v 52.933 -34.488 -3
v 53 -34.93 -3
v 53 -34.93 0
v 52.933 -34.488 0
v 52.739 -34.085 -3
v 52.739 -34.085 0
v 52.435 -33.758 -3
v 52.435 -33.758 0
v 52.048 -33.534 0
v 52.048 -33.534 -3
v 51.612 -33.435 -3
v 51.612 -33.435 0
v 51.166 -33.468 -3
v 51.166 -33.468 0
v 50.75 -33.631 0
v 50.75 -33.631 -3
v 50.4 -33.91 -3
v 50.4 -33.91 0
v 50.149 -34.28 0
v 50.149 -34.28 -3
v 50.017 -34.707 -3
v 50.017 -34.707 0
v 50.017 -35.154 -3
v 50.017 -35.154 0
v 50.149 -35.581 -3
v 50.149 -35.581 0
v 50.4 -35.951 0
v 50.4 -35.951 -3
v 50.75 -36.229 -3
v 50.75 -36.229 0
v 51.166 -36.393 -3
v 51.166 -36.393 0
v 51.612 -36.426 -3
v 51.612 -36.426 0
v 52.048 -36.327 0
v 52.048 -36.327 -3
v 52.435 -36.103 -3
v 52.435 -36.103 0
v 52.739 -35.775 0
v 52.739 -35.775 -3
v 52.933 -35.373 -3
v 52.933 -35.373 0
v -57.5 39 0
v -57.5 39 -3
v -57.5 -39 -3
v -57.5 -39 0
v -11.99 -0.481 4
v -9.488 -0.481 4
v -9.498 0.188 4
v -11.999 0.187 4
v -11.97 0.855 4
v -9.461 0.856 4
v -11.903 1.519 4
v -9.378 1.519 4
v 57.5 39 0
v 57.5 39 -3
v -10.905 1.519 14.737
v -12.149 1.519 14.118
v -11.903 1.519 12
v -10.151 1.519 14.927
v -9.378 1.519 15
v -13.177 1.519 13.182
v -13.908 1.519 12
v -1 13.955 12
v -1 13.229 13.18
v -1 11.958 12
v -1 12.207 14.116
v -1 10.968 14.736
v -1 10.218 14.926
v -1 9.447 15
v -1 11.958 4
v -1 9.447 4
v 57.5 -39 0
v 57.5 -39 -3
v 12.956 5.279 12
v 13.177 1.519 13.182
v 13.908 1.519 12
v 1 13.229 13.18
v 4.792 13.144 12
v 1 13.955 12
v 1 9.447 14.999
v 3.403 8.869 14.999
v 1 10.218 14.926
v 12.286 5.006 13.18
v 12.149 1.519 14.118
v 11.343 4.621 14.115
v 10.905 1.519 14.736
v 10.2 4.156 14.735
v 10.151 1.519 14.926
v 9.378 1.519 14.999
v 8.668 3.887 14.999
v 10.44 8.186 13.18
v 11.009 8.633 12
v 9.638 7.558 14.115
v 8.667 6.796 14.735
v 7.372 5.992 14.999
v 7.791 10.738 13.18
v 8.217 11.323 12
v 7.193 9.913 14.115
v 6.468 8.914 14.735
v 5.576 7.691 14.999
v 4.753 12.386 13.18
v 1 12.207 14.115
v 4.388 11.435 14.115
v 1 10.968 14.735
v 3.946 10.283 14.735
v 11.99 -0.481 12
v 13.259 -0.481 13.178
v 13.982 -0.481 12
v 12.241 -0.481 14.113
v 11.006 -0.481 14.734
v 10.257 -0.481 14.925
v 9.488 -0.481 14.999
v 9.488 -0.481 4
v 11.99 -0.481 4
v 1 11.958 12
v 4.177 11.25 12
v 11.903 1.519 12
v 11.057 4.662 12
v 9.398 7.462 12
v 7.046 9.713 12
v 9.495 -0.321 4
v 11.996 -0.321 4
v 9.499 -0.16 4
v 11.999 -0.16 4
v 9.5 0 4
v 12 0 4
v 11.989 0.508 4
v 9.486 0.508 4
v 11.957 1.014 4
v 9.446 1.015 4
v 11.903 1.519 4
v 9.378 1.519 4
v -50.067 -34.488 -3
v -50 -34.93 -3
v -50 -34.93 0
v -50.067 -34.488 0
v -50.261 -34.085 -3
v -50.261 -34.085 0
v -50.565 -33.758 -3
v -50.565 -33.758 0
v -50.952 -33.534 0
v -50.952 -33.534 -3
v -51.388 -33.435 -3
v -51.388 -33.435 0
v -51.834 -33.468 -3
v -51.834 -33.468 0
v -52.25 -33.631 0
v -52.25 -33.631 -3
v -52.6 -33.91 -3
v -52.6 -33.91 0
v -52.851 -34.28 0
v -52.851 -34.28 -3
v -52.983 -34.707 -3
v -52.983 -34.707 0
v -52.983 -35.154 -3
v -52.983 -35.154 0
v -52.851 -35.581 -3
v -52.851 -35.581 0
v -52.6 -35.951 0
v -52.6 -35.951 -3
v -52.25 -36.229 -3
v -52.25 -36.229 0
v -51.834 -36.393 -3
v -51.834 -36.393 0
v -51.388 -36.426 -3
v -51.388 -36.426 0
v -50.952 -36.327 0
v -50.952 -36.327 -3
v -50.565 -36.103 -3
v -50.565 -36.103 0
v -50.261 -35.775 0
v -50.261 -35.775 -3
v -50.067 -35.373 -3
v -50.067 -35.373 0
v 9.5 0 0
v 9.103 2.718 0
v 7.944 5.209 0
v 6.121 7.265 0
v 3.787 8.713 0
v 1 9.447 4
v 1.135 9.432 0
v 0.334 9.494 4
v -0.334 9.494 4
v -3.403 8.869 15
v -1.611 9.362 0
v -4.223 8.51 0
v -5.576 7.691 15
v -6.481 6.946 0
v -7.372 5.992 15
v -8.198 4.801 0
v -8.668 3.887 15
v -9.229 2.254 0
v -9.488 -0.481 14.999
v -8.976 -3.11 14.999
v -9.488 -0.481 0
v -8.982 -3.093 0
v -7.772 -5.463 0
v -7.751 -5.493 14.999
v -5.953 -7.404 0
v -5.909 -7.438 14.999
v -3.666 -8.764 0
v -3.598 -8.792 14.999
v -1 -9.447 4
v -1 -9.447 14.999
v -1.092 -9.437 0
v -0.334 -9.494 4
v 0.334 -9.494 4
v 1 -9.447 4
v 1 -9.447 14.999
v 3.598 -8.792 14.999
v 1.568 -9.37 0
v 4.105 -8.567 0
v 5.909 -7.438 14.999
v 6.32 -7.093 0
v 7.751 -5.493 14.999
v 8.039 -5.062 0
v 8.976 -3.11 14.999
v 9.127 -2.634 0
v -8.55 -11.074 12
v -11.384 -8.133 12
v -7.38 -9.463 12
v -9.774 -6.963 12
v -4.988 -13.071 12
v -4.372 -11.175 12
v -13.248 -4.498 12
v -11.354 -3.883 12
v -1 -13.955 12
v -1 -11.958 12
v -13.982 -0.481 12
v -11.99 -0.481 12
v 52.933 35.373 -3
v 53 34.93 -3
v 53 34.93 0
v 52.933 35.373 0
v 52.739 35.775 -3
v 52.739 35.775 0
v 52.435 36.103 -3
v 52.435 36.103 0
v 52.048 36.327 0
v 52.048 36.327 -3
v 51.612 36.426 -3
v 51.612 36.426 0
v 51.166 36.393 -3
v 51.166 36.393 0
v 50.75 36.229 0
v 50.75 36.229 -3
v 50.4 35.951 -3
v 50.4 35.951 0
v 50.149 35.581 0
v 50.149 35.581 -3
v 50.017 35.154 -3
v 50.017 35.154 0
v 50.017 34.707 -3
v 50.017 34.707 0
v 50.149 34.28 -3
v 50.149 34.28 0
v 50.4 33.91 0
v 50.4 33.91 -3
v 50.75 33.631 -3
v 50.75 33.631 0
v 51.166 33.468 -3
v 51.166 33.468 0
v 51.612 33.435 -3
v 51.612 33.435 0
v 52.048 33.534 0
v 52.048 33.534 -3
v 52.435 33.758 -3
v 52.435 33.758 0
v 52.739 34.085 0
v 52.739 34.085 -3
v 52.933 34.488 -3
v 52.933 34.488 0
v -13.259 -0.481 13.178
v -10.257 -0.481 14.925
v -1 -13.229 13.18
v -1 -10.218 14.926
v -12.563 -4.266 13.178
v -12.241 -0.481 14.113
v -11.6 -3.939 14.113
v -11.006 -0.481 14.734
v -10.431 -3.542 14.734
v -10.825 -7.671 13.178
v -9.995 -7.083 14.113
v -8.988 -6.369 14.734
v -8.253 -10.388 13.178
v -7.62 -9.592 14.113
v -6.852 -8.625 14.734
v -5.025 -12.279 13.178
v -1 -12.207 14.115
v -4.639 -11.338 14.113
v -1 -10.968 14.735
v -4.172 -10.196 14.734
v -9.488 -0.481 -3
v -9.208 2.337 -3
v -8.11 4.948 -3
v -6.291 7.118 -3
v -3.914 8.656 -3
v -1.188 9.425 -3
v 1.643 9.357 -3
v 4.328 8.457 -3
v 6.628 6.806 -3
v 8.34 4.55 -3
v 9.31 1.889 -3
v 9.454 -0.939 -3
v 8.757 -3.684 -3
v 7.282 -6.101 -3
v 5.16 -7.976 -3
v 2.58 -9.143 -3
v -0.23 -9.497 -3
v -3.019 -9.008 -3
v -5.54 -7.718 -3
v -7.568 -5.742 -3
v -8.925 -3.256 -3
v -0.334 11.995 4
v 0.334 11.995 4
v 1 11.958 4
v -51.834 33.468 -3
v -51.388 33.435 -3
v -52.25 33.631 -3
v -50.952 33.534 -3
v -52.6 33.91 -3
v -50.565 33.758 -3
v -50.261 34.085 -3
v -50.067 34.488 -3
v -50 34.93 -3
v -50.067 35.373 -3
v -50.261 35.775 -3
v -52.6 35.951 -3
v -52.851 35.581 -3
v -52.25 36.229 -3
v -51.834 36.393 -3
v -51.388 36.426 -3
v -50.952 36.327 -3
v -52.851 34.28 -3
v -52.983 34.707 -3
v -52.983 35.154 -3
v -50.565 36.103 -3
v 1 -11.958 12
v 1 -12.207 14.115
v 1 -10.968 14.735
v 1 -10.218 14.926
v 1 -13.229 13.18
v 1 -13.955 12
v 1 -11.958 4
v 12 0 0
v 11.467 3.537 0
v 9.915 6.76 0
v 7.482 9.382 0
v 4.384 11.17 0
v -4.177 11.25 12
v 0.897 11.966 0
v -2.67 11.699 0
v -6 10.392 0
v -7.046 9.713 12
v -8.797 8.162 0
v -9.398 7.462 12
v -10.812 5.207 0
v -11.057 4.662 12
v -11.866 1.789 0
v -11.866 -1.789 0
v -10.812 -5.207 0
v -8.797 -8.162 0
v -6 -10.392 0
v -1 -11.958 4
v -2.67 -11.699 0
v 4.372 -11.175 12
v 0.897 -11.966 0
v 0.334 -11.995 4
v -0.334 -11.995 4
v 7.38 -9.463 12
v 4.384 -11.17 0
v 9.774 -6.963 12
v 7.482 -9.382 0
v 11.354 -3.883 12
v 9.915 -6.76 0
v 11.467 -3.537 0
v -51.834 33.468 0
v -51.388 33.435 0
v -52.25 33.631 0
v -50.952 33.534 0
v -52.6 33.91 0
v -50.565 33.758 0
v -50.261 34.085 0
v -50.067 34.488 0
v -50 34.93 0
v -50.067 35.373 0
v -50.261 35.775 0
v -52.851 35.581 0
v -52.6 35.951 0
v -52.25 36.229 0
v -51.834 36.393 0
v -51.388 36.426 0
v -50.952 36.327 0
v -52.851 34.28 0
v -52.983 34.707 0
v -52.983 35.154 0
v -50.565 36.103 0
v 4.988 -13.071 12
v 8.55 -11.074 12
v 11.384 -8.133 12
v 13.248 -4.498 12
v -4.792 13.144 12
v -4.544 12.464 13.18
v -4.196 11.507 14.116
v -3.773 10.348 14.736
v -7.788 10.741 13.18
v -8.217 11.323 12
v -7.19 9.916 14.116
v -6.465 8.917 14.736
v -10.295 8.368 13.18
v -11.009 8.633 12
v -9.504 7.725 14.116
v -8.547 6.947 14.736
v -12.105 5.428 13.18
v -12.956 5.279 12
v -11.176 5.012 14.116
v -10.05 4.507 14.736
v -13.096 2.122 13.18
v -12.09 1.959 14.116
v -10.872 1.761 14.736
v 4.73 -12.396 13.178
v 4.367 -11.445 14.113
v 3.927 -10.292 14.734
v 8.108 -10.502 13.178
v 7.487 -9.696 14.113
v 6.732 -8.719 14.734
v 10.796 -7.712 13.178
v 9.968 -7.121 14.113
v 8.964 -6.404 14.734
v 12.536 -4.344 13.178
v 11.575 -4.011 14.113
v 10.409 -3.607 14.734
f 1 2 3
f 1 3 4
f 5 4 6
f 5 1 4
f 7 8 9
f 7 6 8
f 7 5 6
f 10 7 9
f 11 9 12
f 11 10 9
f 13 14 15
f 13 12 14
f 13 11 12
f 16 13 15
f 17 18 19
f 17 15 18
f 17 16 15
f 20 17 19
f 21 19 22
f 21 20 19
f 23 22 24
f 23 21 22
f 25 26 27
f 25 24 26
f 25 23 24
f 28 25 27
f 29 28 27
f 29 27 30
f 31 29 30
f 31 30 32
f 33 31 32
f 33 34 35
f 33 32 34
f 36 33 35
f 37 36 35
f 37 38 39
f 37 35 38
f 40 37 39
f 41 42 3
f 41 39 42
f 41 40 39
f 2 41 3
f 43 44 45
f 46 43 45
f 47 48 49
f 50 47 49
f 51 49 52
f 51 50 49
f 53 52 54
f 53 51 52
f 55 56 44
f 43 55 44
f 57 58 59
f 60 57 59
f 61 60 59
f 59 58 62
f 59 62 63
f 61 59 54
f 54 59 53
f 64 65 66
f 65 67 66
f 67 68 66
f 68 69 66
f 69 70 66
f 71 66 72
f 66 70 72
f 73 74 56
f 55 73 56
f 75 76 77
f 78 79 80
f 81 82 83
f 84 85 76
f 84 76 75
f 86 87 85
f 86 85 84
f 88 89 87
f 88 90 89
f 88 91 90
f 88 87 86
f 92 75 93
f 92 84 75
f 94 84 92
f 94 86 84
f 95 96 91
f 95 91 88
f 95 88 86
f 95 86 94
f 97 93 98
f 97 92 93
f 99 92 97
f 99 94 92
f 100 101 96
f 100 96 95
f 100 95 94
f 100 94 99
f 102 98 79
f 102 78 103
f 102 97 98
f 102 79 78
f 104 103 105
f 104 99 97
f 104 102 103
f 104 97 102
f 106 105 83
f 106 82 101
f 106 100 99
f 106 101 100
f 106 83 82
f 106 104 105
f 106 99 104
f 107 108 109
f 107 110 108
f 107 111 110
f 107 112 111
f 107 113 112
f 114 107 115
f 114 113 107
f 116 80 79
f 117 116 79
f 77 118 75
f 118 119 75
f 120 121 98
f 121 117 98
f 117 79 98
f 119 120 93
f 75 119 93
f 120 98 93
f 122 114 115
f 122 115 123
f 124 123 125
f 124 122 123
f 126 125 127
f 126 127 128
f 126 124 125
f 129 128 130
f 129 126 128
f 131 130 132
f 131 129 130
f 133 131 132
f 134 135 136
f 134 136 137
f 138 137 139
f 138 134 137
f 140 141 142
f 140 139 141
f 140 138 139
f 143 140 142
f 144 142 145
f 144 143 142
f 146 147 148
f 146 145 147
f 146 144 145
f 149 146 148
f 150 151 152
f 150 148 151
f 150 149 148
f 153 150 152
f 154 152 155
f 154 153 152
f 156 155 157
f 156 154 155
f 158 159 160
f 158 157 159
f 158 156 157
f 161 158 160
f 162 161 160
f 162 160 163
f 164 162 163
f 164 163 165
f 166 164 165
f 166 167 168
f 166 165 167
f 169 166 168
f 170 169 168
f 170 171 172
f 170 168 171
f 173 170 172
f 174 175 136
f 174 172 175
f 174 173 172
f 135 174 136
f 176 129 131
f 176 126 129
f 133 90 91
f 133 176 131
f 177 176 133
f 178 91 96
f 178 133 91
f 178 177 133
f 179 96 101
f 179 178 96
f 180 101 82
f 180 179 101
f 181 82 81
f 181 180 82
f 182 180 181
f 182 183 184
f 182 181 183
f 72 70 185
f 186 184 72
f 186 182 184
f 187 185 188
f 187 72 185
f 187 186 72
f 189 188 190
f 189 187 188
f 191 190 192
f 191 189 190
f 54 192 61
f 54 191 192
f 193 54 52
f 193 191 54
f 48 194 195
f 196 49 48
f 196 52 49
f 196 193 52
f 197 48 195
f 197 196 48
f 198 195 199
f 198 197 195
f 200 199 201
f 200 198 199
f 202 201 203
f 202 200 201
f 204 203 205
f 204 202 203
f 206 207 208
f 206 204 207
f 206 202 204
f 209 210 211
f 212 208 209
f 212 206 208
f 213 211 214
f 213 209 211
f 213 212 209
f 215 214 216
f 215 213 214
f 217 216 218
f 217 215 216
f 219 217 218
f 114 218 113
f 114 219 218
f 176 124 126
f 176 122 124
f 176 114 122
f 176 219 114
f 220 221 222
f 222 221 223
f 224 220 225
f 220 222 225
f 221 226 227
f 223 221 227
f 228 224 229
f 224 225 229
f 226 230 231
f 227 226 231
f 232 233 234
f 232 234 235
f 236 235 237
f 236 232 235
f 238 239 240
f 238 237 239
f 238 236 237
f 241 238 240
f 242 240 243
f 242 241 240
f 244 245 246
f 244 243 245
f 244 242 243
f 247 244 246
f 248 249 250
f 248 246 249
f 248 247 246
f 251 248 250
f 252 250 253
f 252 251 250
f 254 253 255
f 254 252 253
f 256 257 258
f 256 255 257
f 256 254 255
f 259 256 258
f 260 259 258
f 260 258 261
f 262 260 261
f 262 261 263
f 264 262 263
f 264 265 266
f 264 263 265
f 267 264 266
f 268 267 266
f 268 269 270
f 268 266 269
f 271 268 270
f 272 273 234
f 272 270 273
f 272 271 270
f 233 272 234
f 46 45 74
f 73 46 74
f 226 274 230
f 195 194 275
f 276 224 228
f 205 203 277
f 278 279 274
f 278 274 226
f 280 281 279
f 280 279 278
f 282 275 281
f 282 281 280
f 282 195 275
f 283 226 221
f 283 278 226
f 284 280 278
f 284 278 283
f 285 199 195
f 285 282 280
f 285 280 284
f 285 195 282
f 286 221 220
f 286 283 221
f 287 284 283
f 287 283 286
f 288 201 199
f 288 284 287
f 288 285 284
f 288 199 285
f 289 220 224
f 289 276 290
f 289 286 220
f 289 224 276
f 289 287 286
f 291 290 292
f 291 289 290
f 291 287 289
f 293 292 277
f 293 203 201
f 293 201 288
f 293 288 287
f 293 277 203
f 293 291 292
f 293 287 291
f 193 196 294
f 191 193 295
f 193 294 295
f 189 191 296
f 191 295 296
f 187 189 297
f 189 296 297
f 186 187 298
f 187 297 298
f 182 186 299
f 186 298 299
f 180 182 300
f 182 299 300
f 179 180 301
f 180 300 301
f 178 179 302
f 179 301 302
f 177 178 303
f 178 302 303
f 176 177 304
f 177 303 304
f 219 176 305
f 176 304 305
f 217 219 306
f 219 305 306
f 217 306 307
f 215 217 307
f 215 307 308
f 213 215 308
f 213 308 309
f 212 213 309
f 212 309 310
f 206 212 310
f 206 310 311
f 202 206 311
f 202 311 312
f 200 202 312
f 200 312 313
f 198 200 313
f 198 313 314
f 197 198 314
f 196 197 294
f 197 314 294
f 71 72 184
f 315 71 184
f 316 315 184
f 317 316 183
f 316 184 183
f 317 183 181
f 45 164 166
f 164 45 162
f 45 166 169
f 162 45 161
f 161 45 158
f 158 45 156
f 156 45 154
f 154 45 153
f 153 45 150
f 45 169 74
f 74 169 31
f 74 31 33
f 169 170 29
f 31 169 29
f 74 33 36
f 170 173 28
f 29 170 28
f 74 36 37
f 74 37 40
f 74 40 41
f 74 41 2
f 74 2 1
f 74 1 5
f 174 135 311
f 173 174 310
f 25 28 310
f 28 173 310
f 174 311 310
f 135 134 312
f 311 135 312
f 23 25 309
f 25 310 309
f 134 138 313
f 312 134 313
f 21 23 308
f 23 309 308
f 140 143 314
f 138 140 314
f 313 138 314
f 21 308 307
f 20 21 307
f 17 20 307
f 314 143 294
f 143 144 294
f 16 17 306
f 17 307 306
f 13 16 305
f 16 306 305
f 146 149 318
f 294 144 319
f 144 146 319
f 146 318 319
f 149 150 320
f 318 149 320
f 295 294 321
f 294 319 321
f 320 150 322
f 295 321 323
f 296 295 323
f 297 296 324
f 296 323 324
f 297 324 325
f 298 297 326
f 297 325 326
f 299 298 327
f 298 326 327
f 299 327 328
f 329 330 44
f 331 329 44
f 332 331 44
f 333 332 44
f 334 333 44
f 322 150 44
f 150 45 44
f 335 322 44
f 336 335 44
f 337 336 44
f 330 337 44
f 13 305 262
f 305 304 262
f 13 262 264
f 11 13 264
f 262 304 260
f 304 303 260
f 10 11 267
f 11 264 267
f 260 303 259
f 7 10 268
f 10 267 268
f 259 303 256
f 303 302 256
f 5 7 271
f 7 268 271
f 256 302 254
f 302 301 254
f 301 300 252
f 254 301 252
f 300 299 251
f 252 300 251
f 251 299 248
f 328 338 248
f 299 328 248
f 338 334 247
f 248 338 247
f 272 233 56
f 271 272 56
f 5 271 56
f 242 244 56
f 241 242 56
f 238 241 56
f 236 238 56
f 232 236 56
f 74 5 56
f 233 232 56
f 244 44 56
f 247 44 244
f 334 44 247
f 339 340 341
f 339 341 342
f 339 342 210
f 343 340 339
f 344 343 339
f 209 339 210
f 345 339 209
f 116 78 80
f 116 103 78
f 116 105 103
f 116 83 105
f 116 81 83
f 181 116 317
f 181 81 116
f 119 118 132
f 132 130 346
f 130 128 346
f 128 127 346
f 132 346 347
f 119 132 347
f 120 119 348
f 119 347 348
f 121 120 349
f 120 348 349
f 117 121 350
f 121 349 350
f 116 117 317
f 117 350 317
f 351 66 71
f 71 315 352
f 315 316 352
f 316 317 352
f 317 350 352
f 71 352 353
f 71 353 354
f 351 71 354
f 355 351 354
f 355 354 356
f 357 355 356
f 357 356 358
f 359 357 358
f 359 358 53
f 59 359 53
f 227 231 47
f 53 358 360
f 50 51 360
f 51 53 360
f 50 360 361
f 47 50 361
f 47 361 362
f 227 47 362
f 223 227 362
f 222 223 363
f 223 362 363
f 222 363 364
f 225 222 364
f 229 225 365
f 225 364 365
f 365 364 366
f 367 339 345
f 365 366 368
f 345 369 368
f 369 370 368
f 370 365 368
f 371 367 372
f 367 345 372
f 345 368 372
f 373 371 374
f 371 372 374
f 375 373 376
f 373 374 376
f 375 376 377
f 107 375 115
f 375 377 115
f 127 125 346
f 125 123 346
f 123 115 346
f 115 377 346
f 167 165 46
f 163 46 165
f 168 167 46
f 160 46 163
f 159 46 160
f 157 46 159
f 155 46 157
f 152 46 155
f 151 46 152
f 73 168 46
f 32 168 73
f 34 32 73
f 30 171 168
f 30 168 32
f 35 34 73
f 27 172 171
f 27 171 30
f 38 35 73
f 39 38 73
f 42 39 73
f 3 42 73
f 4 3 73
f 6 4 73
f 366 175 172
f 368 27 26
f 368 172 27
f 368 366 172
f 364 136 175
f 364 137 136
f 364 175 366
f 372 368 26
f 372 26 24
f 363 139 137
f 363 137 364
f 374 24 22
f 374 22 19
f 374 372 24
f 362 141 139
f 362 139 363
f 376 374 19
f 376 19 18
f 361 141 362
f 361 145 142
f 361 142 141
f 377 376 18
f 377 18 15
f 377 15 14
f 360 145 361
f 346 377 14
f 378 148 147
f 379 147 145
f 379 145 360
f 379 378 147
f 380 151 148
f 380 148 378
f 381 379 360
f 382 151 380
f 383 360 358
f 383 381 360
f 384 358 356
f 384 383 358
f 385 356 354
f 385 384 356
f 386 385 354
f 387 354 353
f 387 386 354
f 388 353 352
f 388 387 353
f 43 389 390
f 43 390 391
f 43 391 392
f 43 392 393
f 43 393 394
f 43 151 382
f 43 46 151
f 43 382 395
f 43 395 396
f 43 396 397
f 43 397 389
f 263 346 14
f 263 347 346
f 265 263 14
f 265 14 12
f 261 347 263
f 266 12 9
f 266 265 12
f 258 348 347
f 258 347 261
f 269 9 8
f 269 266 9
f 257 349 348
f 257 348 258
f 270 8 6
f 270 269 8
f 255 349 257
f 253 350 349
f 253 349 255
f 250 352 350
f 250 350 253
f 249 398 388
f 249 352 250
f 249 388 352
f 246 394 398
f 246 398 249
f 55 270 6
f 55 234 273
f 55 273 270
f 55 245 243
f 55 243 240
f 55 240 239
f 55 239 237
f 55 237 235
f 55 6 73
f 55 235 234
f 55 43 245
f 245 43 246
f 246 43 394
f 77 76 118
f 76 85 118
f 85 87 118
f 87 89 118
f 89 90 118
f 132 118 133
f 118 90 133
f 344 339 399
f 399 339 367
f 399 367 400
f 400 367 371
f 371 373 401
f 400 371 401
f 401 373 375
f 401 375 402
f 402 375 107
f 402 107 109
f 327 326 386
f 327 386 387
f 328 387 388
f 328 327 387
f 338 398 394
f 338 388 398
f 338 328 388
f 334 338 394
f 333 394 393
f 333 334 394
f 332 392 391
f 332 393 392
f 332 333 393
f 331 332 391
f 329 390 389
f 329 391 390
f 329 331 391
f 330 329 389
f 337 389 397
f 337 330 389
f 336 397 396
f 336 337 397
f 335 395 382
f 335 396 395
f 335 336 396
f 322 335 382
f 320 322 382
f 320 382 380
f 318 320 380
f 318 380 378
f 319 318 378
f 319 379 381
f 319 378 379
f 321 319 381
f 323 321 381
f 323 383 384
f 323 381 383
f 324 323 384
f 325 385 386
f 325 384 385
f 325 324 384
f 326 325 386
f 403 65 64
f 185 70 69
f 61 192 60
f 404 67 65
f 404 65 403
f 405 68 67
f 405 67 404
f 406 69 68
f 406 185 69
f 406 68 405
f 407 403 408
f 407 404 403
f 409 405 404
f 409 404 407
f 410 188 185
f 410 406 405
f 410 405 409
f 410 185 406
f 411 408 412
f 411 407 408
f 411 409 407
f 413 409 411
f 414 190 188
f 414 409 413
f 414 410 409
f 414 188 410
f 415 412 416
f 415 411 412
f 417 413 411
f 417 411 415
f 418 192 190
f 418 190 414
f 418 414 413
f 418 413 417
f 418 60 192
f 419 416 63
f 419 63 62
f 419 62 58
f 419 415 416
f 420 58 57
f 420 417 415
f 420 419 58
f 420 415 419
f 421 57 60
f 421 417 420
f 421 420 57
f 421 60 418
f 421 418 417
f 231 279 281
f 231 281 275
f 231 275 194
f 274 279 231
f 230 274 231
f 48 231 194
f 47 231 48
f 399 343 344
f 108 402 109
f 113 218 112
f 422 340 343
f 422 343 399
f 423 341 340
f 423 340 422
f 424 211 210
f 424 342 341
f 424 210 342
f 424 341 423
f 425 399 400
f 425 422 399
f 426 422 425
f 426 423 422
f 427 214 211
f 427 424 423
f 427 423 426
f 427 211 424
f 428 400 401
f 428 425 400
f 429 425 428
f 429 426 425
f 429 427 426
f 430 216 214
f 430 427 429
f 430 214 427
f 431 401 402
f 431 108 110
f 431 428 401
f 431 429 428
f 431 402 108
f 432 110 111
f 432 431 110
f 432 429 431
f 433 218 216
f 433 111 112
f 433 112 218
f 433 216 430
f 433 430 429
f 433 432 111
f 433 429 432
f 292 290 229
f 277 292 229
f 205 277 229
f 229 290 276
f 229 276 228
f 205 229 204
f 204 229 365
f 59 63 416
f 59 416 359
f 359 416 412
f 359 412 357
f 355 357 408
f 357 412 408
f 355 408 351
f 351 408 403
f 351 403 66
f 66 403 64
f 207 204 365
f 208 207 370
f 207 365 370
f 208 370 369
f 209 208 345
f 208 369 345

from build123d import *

# Parameters (mm, degrees)
ESBO_O1_R                      = 12
ESBO_O1_R_2                    = 9.5
RESSALTO_EXTRUS_O1_DEPTH       = 12
RESSALTO_EXTRUS_O2_START       = 12
RESSALTO_EXTRUS_O2_OUTLINE_R   = 13.990411925
RESSALTO_EXTRUS_O2_OUTLINE_R_2 = 9.5
RESSALTO_EXTRUS_O2_DEPTH       = 3
CORTE_EXTRUS_O1_DEPTH          = 17
CORTE_EXTRUS_O1_DEPTH_BACK     = 19
ESBO_O2_W                      = 17.351165954
ESBO_O2_H                      = 2
CORTE_EXTRUS_O2_DEPTH          = 19
CORTE_EXTRUS_O2_DEPTH_BACK     = 19
ESBO_O3_W                      = 2
ESBO_O3_H                      = 13.611936421
FILETE1_R                      = 5
FILETE2_R                      = 5
FILETE3_R                      = 5
FILETE4_R                      = 5
RESSALTO_EXTRUS_O3_START       = 3
F_3DSKETCH3_R                  = 9.5
RESSALTO_EXTRUS_O3_DEPTH       = 3
CORTE_EXTRUS_O3_DEPTH          = 14
CORTE_EXTRUS_O3_DEPTH_BACK     = 63
F_3DSKETCH4_R                  = 1.5


with BuildPart() as part:
    # Esboço1 → Ressalto-extrusão1 (new body)
    with BuildSketch(Plane.XY):
        Circle(ESBO_O1_R)
        Circle(ESBO_O1_R_2, mode=Mode.SUBTRACT)
    extrude(amount=RESSALTO_EXTRUS_O1_DEPTH)

    # Ressalto-extrusão2: read off the stored shape, not the designer's step
    # Ressalto-extrusão2 outline → Ressalto-extrusão2 (add)
    with BuildSketch(Plane.XY.offset(RESSALTO_EXTRUS_O2_START)):
        Circle(RESSALTO_EXTRUS_O2_OUTLINE_R)
        Circle(RESSALTO_EXTRUS_O2_OUTLINE_R_2, mode=Mode.SUBTRACT)
    extrude(amount=RESSALTO_EXTRUS_O2_DEPTH)

    # Esboço2 → Corte-extrusão1 (cut, two sides: drawn at the far end of the back side and taken through both)
    with BuildSketch(Plane(origin=(0, 0, 0), x_dir=(0, 0, -1), z_dir=(1, 0, 0)).offset(-CORTE_EXTRUS_O1_DEPTH_BACK)):
        with Locations((-12.675582977, 0.519294875)):
            Rectangle(ESBO_O2_W, ESBO_O2_H)
    extrude(amount=CORTE_EXTRUS_O1_DEPTH + CORTE_EXTRUS_O1_DEPTH_BACK, mode=Mode.SUBTRACT)

    # Esboço3 → Corte-extrusão2 (cut, two sides: drawn at the far end of the back side and taken through both)
    with BuildSketch(Plane(origin=(0, 0, 0), x_dir=(1, 0, 0), z_dir=(0, 1, 0)).offset(-CORTE_EXTRUS_O2_DEPTH_BACK)):
        with Locations((0, -10.80596821)):
            Rectangle(ESBO_O3_W, ESBO_O3_H)
    extrude(amount=CORTE_EXTRUS_O2_DEPTH + CORTE_EXTRUS_O2_DEPTH_BACK, mode=Mode.SUBTRACT)

    # Filete1
    # the kernel refuses this fillet: 5 mm, written as the material it takes off along each edge
    with BuildSketch(Plane(origin=(0, 0, 15), x_dir=(0.7581495843682223, -0.6520806757773855, 0), z_dir=(-0.6520806757773855, -0.7581495843682223, 0))) as filete1_piece_1_section:
        with BuildLine():
            CenterArc((9.40783623, -5), FILETE1_R, 23.578178478, 66.421821522)
            Line((9.40783623, 0), (13.990411925, 0))
            Line((13.990411925, 0), (13.990411925, -3))
        make_face()
    filete1_piece_1 = revolve(axis=Axis((0, 0, 15), (0, 0, 1)), revolution_arc=173.532819647, mode=Mode.PRIVATE)
    filete1_piece_1 = split(filete1_piece_1, bisect_by=Plane(origin=(1, 0, 15), z_dir=(1, 0, 0)), keep=Keep.TOP, mode=Mode.PRIVATE)
    filete1_piece_1 = split(filete1_piece_1, bisect_by=Plane(origin=(0, 1.519294875, 15), z_dir=(0, 1, 0)), keep=Keep.TOP, mode=Mode.PRIVATE)
    add(filete1_piece_1, mode=Mode.SUBTRACT)

    # Filete2
    # the kernel refuses this fillet: 5 mm, written as the material it takes off along each edge
    with BuildSketch(Plane(origin=(0, 0, 15), x_dir=(-0.679899413949249, -0.7333053844828004, 0), z_dir=(-0.7333053844828004, 0.679899413949249, 0))) as filete2_piece_1_section:
        with BuildLine():
            CenterArc((9.40783623, -5), FILETE2_R, 23.578178478, 66.421821522)
            Line((13.990411925, -3), (13.990411925, 0))
            Line((13.990411925, 0), (9.40783623, 0))
        make_face()
    filete2_piece_1 = revolve(axis=Axis((0, 0, 15), (0, 0, 1)), revolution_arc=177.801374174, mode=Mode.PRIVATE)
    filete2_piece_1 = split(filete2_piece_1, bisect_by=Plane(origin=(-1, 0, 15), z_dir=(1, 0, 0)), keep=Keep.TOP, mode=Mode.PRIVATE)
    add(filete2_piece_1, mode=Mode.SUBTRACT)

    # Filete3
    # the kernel refuses this fillet: 5 mm, written as the material it takes off along each edge
    with BuildSketch(Plane(origin=(0, 0, 15), x_dir=(-0.7075313095917145, 0.7066819977524781, 0), z_dir=(0.7066819977524781, 0.7075313095917145, 0))) as filete3_piece_1_section:
        with BuildLine():
            CenterArc((9.40783623, -5), FILETE3_R, 23.578178478, 66.421821522)
            Line((13.990411925, -3), (13.990411925, 0))
            Line((13.990411925, 0), (9.40783623, 0))
        make_face()
    filete3_piece_1 = revolve(axis=Axis((0, 0, 15), (0, 0, 1)), revolution_arc=177.801374174, mode=Mode.PRIVATE)
    filete3_piece_1 = split(filete3_piece_1, bisect_by=Plane(origin=(0, -0.480705125, 15), z_dir=(0, -1, 0)), keep=Keep.TOP, mode=Mode.PRIVATE)
    add(filete3_piece_1, mode=Mode.SUBTRACT)

    # Filete4
    # the kernel refuses this fillet: 5 mm, written as the material it takes off along each edge
    with BuildSketch(Plane(origin=(0, 0, 15), x_dir=(0.6677059228451385, 0.744425147746583, 0), z_dir=(0.744425147746583, -0.6677059228451385, 0))) as filete4_piece_1:
        with BuildLine():
            CenterArc((9.407462566, -4.999143609), FILETE4_R, 23.567471489, 65.372067079)
            Line((13.990411925, -3), (14.082070912, -2.960017128))
            ThreePointArc((14.082070912, -2.960017128), (14.090411925, -1.5), (14.090411925, 0))
            Line((14.090411925, 0), (13.990411925, 0.1))
            ThreePointArc((13.990411925, 0.1), (11.745205963, 0.1), (9.501850749, 0.099982872))
            Line((9.501850749, 0.099982872), (9.5, 0))
        make_face()
    revolve(axis=Axis((0, 0, 15), (0, 0, 1)), revolution_arc=171.645006374, mode=Mode.SUBTRACT)

    # 3DSketch3 → Ressalto-extrusão3 (add)
    with BuildSketch(Plane(origin=(57.5, 39, 0), x_dir=(-0.8275951732462348, -0.5613254218539678, 0), z_dir=(0, 0, -1)).offset(RESSALTO_EXTRUS_O3_START)):
        Polygon((0, 0), (95.173444923, 64.552423513), (138.956827828, 0), (43.783382905, -64.552423513), align=None)
        with Locations(Location((69.478413914, 0, 0), (0, 0, 31.247073166))):
            Circle(F_3DSKETCH3_R, mode=Mode.SUBTRACT)
    extrude(amount=-RESSALTO_EXTRUS_O3_DEPTH)

    # 3DSketch4 → Corte-extrusão3 (cut, two sides: drawn at the far end of the back side and taken through both)
    with BuildSketch(Plane(origin=(51.5, 34.930434783, -3), x_dir=(-0.8275951732462347, -0.5613254218539678, 0), z_dir=(0, 0, 1)).offset(-CORTE_EXTRUS_O3_DEPTH_BACK)):
        with Locations(Location((0, 0, 0), (0, 0, 145.85249086))):
            Circle(F_3DSKETCH4_R)
        with Locations(Location((39.21468208, 57.816518451, 0), (0, 0, 145.85249086))):
            Circle(F_3DSKETCH4_R)
        with Locations(Location((124.456984924, 0, 0), (0, 0, 145.85249086))):
            Circle(F_3DSKETCH4_R)
        with Locations(Location((85.242302844, -57.816518451, 0), (0, 0, 145.85249086))):
            Circle(F_3DSKETCH4_R)
    extrude(amount=CORTE_EXTRUS_O3_DEPTH + CORTE_EXTRUS_O3_DEPTH_BACK, mode=Mode.SUBTRACT)


solid = part.part
